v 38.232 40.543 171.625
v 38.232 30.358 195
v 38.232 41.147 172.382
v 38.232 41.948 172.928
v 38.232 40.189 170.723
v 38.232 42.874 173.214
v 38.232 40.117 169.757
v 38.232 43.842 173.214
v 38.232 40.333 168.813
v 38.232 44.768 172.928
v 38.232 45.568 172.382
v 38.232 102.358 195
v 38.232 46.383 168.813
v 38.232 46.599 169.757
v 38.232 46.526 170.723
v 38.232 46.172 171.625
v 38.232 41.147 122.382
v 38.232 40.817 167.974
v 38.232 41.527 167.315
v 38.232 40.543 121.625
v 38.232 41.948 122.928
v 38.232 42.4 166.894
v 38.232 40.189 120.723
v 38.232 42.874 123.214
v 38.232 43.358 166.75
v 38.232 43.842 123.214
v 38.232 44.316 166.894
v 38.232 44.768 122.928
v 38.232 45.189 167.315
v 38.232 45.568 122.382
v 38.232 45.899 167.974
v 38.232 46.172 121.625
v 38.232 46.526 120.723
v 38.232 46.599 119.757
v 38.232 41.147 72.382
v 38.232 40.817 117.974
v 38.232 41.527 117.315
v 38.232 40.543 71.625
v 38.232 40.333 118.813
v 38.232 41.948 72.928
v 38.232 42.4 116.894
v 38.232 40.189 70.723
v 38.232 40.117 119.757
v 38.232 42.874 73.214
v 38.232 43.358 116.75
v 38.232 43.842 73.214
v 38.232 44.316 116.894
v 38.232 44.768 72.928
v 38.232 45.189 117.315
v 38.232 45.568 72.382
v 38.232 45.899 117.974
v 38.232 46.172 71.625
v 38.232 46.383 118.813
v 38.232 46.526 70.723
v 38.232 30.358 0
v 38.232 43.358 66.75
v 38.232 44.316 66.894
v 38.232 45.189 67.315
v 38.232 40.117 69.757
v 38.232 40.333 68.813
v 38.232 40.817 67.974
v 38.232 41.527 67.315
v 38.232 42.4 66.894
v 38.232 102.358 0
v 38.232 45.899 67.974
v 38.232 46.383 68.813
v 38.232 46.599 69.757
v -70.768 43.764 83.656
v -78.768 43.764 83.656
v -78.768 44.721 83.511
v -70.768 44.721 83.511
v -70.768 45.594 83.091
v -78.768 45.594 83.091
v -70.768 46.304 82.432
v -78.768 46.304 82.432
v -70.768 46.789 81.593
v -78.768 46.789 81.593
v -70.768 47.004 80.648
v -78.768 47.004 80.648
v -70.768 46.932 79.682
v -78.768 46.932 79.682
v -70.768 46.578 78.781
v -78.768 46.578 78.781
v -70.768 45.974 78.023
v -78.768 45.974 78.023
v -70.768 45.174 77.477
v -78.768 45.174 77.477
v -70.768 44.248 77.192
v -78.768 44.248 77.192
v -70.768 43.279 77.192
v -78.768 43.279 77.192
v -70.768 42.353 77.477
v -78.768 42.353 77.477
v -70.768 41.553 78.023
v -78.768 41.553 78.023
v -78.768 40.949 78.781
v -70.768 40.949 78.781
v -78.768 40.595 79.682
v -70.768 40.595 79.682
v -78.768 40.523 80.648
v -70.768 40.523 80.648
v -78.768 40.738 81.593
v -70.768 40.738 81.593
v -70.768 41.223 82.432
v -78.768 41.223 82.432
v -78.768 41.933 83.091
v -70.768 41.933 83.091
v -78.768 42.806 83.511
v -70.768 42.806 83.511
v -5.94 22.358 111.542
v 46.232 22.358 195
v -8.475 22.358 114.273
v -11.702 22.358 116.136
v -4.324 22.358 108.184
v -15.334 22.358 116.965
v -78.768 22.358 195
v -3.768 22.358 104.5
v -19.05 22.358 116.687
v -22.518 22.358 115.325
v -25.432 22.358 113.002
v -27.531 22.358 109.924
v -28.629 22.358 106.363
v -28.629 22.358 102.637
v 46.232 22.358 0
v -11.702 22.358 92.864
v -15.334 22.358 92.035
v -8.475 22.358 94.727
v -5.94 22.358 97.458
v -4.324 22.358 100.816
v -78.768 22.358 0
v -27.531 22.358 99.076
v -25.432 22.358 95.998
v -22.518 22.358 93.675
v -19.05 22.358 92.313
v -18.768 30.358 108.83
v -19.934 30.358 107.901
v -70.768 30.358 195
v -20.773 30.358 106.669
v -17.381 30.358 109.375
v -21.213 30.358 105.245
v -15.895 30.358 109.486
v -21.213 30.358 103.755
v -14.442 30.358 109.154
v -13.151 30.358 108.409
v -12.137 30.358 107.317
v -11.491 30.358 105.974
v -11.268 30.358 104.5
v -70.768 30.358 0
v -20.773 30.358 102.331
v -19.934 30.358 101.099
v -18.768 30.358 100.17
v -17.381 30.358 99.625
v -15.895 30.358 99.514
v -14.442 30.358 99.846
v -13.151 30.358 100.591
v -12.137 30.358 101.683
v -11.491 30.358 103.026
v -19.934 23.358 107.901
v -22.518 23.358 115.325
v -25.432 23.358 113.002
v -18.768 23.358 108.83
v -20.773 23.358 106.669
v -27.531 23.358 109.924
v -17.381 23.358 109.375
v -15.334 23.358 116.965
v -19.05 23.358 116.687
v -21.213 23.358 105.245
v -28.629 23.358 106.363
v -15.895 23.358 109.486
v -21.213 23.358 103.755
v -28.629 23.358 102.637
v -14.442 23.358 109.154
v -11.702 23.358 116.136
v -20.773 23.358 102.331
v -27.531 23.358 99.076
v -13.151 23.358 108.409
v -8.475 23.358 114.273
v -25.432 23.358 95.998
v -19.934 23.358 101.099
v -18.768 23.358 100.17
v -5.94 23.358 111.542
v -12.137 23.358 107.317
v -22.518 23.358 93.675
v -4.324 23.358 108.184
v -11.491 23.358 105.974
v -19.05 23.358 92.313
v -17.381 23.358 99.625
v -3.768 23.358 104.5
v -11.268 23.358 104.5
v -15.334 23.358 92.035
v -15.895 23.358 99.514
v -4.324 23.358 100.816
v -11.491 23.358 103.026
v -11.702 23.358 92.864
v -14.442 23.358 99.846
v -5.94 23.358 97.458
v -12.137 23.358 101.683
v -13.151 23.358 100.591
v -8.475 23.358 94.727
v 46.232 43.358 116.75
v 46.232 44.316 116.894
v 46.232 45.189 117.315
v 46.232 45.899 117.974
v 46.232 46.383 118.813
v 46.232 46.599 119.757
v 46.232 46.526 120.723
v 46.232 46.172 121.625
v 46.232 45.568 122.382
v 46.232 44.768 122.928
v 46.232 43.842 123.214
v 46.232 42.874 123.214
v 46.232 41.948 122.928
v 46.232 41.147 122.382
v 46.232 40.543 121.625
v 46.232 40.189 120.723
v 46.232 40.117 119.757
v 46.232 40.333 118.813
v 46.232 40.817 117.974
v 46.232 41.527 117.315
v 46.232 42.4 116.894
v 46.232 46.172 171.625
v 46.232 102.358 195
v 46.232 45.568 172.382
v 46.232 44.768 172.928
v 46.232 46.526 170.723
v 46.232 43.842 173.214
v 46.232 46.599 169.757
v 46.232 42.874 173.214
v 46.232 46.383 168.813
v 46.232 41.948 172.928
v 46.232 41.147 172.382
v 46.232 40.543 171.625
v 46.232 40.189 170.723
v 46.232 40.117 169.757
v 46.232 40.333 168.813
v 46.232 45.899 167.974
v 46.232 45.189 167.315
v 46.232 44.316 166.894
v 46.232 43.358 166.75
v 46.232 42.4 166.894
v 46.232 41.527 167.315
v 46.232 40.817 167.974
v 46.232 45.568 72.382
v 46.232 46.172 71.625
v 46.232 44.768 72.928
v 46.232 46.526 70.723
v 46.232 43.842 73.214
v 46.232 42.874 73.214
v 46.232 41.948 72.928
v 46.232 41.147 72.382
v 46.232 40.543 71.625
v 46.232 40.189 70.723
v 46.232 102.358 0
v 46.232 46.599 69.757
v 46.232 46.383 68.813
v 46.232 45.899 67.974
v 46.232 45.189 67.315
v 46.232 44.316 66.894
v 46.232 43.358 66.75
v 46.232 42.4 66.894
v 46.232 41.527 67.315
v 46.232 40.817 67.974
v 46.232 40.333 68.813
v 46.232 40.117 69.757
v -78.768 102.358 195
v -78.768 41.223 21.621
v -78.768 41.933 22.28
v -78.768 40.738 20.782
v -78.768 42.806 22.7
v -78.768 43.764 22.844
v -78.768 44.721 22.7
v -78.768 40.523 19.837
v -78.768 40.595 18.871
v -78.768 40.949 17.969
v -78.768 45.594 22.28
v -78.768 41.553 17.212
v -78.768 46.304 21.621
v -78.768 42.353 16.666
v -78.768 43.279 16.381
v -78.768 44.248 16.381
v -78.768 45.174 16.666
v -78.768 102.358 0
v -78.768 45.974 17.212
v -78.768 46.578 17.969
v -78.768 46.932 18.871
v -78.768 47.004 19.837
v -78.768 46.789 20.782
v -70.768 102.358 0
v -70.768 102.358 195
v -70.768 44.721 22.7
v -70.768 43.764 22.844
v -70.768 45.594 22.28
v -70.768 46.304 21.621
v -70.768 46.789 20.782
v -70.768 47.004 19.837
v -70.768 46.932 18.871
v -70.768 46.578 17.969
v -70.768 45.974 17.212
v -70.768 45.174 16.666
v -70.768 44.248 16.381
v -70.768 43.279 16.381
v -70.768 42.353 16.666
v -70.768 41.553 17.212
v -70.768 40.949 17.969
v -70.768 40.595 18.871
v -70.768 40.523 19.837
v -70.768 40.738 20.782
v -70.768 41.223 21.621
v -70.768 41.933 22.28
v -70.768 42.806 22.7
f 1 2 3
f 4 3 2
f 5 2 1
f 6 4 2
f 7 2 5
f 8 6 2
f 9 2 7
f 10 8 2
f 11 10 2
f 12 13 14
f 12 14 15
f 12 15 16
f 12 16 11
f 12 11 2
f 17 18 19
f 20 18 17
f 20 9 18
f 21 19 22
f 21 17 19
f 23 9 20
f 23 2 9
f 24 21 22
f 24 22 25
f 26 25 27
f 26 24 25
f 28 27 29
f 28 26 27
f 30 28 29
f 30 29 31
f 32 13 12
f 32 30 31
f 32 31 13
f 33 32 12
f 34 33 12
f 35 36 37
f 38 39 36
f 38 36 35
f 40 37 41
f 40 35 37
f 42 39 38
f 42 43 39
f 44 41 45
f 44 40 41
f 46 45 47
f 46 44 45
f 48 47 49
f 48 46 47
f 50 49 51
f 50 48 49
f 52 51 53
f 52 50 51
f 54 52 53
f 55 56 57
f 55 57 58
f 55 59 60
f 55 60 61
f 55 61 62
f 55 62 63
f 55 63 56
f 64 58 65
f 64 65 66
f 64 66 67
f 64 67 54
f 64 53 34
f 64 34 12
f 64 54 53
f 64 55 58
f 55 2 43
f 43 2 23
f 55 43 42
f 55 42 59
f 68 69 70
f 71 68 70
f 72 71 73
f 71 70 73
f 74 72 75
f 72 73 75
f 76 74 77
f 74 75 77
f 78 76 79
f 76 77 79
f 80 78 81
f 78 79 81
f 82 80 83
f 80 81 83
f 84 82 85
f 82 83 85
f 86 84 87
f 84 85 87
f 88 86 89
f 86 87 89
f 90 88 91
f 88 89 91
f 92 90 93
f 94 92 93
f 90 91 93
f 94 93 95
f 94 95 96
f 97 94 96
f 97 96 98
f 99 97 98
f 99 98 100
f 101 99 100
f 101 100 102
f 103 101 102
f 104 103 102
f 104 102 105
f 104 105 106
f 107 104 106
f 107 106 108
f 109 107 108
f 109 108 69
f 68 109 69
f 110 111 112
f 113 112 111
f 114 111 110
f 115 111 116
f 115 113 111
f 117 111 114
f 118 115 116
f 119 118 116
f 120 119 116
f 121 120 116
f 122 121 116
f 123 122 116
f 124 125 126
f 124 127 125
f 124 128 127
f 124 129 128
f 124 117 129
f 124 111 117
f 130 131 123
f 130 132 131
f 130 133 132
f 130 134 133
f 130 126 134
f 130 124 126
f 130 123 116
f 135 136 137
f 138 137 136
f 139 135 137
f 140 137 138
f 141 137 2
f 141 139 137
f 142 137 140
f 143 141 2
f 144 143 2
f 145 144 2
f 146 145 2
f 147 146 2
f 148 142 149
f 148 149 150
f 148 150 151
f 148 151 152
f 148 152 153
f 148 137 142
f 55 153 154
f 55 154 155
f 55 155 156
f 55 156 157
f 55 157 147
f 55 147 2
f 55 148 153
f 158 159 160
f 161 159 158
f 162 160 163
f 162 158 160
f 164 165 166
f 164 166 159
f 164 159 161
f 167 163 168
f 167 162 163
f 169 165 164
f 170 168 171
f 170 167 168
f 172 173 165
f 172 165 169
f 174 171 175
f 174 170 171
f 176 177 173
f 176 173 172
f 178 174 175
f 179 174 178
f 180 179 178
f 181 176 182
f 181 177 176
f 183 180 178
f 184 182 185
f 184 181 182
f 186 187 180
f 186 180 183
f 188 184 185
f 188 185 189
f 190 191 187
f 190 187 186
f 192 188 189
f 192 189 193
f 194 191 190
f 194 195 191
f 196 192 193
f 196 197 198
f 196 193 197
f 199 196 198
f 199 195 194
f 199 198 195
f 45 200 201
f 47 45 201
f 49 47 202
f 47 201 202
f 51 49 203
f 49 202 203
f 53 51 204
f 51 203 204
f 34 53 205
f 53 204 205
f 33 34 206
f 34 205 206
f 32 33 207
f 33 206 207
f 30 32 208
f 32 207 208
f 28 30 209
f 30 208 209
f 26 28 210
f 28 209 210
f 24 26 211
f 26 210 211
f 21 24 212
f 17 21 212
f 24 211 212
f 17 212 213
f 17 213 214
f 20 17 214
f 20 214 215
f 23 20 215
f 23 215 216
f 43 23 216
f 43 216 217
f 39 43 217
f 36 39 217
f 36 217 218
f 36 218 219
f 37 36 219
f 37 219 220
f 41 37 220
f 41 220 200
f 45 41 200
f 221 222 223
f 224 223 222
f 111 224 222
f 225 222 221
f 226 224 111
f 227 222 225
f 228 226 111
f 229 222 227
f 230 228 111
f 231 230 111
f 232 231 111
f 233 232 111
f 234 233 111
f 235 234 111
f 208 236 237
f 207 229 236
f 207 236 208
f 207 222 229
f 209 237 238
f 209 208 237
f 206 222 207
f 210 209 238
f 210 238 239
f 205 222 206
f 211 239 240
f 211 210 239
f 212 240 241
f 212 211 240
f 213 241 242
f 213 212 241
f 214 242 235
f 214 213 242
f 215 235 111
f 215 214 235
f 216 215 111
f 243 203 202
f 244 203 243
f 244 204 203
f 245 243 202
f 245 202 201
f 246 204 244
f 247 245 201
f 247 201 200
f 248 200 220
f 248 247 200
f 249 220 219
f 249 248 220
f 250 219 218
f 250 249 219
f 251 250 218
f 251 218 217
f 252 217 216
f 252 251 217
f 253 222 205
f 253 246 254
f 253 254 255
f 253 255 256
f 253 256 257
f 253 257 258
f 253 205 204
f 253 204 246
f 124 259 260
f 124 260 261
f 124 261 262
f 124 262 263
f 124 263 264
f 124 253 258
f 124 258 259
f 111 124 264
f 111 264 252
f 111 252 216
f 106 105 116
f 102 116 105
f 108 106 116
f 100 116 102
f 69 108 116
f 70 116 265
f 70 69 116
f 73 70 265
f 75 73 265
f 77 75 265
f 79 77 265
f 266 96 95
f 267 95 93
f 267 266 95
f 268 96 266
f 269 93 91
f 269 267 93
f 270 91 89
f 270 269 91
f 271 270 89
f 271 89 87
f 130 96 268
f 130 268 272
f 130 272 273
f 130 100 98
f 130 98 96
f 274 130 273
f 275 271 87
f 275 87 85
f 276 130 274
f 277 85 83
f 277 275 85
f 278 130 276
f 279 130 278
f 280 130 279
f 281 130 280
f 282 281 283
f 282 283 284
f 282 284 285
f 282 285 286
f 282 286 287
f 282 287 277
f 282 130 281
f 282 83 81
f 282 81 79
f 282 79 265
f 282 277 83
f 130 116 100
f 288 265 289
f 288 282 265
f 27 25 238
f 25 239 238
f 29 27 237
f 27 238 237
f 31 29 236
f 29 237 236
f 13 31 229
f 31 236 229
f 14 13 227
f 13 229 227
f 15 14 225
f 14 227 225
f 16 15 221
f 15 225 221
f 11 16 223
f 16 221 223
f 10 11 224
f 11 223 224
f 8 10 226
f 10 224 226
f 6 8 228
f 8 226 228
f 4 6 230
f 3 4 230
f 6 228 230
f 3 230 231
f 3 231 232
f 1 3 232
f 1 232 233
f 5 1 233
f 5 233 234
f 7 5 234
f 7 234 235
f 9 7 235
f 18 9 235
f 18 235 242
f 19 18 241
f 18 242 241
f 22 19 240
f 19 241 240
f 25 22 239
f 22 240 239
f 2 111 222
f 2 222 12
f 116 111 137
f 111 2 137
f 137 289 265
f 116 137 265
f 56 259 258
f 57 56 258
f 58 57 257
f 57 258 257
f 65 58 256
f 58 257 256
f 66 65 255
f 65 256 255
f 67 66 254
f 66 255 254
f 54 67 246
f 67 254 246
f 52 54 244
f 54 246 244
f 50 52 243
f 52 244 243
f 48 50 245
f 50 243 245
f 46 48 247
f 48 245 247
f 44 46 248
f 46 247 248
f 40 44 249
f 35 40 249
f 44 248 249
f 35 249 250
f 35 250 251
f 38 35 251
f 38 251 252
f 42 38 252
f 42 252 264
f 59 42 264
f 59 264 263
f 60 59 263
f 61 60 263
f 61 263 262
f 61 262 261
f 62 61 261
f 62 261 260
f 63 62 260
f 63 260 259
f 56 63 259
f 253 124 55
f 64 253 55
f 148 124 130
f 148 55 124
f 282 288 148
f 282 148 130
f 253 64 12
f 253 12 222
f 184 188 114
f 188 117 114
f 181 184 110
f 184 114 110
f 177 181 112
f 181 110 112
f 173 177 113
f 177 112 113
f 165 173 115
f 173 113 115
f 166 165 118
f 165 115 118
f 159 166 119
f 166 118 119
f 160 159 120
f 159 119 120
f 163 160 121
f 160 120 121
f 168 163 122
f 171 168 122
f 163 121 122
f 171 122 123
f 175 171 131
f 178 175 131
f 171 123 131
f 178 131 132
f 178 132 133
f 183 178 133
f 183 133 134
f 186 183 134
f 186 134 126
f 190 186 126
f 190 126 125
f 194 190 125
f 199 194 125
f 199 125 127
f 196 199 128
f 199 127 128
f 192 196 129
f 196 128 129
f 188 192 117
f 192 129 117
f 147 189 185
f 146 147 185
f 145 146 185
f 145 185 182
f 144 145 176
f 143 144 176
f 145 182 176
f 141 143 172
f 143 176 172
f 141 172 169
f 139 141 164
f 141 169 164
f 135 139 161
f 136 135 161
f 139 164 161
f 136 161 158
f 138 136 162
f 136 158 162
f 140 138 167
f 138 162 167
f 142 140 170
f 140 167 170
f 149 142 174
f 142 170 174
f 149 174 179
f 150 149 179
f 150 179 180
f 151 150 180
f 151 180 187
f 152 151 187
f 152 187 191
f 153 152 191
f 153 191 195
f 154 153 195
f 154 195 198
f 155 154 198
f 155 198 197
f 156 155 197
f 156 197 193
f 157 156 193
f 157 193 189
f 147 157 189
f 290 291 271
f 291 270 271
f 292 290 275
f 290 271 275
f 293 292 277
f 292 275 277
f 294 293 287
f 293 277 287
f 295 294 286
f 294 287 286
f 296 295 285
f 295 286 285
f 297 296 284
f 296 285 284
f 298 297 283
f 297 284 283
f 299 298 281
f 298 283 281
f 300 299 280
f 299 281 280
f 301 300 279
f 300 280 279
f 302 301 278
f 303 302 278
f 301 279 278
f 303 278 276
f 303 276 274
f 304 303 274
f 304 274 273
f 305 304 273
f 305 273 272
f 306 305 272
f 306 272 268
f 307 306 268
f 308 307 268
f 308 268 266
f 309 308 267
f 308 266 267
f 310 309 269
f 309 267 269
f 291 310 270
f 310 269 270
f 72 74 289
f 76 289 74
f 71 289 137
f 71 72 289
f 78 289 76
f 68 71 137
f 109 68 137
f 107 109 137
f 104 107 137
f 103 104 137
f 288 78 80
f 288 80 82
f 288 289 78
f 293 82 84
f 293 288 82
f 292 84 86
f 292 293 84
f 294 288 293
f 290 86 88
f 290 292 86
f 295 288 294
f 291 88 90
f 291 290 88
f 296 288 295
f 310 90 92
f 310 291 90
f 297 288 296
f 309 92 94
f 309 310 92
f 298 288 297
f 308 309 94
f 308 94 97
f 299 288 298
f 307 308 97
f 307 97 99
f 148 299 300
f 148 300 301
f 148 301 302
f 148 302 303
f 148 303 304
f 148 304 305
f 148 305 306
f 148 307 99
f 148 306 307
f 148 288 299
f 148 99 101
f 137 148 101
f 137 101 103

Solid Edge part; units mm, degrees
sketch "Sketch1" plane through (0, 0, 0) normal (0, 0, 1) x (1, 0, 0)
  line L0 (-78.7684, 102.3579) -> (-70.7684, 102.3579)
  line L1 (-70.7684, 102.3579) -> (-70.7684, 30.3579)
  line L2 (-70.7684, 30.3579) -> (38.2316, 30.3579)
  line L3 (38.2316, 30.3579) -> (38.2316, 102.3579)
  line L4 (38.2316, 102.3579) -> (46.2316, 102.3579)
  line L5 (46.2316, 102.3579) -> (46.2316, 22.3579)
  line L6 (46.2316, 22.3579) -> (-78.7684, 22.3579)
  line L7 (-78.7684, 22.3579) -> (-78.7684, 102.3579)
  dimension "D1" = 8
  dimension "D2" = 8
  dimension "D3" = 125
  dimension "D4" = 8
  dimension "D5" = 80
extrude "Protrusion1" add sketch "Sketch1" along normal blind 195
hole "Hole_1" at (46.2316, 43.3579, 120) direction (-1, 0, 0) diameter 6.5 end up to next
hole "Hole1" at (46.2316, 43.3579, 70) direction (-1, 0, 0) diameter 6.5 end up to next
hole "Hole2" at (46.2316, 43.3579, 170) direction (-1, 0, 0) diameter 6.5 end up to next
sketch "Sketch2" plane through (-16.2684, 22.3579, 75) normal (0, -1, 0) x (1, 0, 0)
  circle A0 centre (0, 29.5) radius 5
  dimension "D1" = 10
  dimension "D2" = 125
  dimension "D3" = 62.5
  dimension "D4" = 65.5
extrude "Cutout1" cut sketch "Sketch2" against normal through all
sketch "Sketch3" plane through (-16.2684, 22.3579, 75) normal (0, -1, 0) x (1, 0, 0)
  circle A0 centre (0, 29.5) radius 12.5
  dimension "D1" = 25
extrude "ExtrudedCutout_2" cut sketch "Sketch3" against normal blind 1
hole "Hole_6" at (-78.7684, 43.7635, 19.5944) direction (1, 0, 0) diameter 6.5 end up to next
hole "Hole3" at (-78.7684, 43.7635, 80.4056) direction (1, 0, 0) diameter 6.5 end up to next
properties material "Aluminum, 6061-T6"
